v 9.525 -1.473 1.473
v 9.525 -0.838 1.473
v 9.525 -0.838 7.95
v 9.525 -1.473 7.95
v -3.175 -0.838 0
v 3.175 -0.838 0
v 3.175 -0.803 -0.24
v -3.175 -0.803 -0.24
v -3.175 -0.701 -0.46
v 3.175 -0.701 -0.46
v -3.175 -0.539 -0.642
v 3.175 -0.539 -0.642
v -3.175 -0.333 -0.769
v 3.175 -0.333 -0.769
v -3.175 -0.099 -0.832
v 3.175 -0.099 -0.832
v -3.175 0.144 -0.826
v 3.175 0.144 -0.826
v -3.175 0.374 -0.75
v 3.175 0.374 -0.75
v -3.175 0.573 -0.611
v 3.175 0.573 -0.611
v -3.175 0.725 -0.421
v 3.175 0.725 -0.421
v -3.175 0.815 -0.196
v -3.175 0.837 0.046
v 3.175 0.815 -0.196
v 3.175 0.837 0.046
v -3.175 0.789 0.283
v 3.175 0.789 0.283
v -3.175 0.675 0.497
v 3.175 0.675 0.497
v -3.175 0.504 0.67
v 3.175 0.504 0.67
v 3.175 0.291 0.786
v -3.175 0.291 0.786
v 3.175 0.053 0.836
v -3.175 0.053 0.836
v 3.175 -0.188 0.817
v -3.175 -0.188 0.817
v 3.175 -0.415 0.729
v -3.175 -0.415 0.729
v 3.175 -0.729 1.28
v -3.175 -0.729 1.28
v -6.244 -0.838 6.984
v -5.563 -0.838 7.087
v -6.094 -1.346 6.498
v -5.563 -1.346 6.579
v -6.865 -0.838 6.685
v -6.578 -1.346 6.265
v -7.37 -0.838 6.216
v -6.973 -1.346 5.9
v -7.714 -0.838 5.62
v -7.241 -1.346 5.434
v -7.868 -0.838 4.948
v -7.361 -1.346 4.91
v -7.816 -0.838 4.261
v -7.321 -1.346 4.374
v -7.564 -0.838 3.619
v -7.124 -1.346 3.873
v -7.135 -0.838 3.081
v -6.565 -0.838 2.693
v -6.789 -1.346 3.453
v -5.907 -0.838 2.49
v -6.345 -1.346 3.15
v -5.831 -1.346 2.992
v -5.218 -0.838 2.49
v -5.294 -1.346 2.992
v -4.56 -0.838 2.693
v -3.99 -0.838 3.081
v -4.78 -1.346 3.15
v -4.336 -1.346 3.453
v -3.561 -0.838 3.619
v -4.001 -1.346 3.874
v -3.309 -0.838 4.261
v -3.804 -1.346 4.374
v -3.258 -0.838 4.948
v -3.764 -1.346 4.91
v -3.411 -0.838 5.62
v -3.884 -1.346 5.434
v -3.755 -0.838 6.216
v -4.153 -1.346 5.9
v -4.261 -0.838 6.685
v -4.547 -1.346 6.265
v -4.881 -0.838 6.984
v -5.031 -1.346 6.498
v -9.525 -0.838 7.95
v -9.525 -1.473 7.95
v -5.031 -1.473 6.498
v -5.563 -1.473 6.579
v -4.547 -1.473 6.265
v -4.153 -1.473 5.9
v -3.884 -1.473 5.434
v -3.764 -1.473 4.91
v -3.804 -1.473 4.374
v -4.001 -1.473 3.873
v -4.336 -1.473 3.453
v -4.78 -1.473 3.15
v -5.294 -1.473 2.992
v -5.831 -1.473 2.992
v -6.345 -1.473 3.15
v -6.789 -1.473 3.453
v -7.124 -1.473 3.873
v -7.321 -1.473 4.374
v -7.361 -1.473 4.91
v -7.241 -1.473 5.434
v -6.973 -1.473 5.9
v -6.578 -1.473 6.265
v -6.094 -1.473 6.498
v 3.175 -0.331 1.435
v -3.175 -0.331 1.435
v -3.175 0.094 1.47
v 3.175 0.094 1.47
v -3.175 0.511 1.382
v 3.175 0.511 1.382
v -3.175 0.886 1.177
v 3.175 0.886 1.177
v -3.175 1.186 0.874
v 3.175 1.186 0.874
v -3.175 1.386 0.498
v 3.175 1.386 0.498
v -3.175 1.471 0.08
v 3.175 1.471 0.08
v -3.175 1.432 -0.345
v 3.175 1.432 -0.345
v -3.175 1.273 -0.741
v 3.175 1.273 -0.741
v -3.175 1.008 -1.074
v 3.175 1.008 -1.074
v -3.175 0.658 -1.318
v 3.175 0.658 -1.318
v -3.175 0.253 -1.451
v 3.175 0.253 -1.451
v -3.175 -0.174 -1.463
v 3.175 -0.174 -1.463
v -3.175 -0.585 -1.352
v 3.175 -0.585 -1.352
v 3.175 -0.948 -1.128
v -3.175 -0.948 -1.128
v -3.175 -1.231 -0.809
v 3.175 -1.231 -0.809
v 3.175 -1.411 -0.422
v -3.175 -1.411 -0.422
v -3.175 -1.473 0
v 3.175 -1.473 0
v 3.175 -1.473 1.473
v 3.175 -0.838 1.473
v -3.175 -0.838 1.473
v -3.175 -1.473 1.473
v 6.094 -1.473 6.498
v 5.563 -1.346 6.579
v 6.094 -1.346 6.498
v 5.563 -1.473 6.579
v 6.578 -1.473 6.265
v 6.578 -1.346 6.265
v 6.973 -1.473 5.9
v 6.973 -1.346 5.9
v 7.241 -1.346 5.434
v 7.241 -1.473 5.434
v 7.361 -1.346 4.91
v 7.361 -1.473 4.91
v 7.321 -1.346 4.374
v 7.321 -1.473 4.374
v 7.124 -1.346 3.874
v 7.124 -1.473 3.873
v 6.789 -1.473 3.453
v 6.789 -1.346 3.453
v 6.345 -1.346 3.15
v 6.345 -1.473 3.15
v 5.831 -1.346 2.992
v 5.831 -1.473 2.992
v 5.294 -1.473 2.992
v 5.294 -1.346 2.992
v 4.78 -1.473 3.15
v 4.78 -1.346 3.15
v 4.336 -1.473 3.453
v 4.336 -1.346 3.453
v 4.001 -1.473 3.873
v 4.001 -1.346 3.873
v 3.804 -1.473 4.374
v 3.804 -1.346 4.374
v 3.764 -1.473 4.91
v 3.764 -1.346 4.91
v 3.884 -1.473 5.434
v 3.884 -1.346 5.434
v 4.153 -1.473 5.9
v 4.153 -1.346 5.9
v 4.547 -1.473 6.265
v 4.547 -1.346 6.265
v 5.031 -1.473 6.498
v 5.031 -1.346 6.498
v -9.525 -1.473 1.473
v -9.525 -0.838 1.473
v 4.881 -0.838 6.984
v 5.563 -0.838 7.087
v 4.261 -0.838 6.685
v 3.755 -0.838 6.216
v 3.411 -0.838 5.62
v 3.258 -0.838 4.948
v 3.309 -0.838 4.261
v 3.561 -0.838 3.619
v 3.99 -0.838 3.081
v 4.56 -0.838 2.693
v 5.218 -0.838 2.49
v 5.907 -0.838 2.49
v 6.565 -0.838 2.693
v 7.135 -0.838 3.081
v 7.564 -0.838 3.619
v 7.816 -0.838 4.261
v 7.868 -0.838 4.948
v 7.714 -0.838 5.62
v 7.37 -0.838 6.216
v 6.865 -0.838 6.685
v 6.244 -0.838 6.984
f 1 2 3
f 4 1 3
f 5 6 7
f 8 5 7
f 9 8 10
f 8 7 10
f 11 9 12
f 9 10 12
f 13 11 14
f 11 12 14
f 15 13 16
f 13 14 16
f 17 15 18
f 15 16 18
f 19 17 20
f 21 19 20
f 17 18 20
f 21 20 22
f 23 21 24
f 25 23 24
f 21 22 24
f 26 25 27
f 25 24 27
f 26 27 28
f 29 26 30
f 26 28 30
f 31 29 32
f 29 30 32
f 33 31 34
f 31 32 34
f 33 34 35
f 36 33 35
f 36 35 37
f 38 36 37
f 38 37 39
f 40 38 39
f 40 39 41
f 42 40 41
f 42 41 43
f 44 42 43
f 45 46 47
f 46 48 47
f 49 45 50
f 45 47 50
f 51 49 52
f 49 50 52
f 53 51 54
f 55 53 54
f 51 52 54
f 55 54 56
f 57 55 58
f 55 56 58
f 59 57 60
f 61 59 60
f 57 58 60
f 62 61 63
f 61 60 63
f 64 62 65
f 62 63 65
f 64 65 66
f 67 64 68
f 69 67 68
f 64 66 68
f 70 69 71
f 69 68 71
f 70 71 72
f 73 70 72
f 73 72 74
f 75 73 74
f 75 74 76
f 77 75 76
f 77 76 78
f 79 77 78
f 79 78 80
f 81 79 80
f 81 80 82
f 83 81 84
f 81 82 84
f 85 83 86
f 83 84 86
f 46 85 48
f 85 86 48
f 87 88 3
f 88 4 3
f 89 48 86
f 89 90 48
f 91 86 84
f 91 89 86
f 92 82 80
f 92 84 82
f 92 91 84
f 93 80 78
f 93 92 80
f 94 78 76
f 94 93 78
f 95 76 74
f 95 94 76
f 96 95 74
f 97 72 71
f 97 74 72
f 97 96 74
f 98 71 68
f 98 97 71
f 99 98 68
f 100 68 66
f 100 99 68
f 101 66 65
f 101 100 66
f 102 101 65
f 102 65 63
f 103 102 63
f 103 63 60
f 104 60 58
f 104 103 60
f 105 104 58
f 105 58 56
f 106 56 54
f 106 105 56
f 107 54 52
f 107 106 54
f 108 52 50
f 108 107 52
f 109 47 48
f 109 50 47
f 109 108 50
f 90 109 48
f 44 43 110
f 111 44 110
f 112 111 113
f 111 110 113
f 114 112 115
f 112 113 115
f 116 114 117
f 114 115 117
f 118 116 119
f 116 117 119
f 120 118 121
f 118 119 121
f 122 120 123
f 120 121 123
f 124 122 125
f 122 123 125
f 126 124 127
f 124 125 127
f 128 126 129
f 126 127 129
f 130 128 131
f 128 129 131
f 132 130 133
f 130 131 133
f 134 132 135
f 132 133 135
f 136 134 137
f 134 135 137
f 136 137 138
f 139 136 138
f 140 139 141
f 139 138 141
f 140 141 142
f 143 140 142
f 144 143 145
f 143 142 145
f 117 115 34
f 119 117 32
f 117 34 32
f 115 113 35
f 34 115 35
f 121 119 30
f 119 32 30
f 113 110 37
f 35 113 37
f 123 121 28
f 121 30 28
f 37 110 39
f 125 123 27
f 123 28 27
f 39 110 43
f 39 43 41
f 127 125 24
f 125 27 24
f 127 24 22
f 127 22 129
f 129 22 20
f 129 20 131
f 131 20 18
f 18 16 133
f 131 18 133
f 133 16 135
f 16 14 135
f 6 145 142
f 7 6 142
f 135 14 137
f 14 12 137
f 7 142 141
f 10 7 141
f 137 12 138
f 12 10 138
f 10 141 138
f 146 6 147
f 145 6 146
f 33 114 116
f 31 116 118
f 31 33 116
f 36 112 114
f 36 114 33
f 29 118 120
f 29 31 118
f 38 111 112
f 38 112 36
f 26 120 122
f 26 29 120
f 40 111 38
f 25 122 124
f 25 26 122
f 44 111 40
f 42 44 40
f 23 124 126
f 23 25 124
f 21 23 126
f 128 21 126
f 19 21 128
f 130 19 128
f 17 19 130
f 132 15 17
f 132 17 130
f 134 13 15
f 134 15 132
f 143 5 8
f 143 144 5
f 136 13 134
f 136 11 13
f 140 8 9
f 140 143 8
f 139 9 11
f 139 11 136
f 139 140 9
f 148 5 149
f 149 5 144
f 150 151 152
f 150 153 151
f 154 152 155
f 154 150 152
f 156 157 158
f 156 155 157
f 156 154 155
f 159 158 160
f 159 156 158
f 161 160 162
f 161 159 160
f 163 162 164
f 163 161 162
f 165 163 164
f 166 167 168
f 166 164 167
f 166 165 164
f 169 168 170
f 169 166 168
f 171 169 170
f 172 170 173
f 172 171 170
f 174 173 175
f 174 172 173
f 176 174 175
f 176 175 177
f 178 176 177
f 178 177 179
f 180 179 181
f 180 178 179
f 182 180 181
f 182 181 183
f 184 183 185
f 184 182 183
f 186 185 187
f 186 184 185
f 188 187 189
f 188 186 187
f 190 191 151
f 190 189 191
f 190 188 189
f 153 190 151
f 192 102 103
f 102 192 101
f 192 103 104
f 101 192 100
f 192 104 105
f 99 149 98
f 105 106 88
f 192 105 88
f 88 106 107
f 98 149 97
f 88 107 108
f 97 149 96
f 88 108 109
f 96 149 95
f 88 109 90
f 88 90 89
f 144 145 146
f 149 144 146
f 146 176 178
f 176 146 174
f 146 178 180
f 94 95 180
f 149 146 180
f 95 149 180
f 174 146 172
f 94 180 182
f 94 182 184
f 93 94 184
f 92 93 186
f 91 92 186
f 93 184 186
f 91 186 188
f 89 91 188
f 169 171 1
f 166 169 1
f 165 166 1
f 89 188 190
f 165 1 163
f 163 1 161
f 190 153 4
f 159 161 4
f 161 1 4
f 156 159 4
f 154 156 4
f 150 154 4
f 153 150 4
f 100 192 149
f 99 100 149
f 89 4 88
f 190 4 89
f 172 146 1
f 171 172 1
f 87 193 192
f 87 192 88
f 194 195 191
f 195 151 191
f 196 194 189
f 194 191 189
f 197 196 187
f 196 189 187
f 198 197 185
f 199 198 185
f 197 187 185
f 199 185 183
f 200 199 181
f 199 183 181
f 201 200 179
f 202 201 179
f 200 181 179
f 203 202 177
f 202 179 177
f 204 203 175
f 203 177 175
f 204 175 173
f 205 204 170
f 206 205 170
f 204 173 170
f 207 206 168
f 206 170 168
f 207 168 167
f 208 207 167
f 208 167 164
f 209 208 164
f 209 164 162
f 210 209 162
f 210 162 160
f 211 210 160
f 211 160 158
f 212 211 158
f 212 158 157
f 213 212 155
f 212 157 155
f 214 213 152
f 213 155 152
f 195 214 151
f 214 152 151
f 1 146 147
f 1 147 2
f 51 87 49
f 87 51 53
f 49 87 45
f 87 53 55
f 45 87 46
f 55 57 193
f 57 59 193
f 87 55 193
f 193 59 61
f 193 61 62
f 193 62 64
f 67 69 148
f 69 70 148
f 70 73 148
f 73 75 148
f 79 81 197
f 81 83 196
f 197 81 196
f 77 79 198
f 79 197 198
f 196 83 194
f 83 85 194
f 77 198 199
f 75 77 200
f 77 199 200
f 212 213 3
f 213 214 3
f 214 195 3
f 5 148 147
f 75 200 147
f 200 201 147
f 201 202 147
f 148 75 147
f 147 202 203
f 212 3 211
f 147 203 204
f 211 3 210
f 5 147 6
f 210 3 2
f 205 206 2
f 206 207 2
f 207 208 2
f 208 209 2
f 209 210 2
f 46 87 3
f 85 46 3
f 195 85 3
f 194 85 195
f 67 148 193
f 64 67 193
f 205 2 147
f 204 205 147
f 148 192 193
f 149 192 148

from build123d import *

# Parameters (mm, degrees)
BOSS_EXTRUDE1_DEPTH     = 9.525
CUT_EXTRUDE1_DEPTH      = 13.494063522
CUT_EXTRUDE1_DEPTH_BACK = 13.494063522
SKETCH4_W               = 6.35
SKETCH4_H               = 2.9464
CUT_EXTRUDE3_DEPTH      = 13.494063522
CUT_EXTRUDE3_DEPTH_BACK = 13.494063522
SKETCH9_R               = 1.8034


with BuildPart() as part:
    # Sketch3 → Boss-Extrude1 (new, symmetric)
    with BuildSketch(Plane(origin=(0, 0, 0), x_dir=(0, 0, -1), z_dir=(1, 0, 0))):
        with BuildLine():
            Line((0, -1.4732), (-7.9502, -1.4732))
            Line((-7.9502, -1.4732), (-7.9502, -0.8382))
            Line((-7.9502, -0.8382), (0, -0.8382))
            ThreePointArc((0, -0.8382), (0.421388638, 0.724576328), (-0.728533124, -0.414510226))
            Line((-0.728533124, -0.414510226), (-1.280452157, -0.728533124))
            ThreePointArc((-1.280452157, -0.728533124), (0.740622455, 1.273497789), (0, -1.4732))
        make_face()
    extrude(amount=BOSS_EXTRUDE1_DEPTH, both=True)

    # Sketch4 → Cut-Extrude1 (cut, two sides: drawn at the far end of the back side and taken through both)
    with BuildSketch(Plane(origin=(0, 0, 0), x_dir=(1, 0, 0), z_dir=(0, 1, 0)).offset(-CUT_EXTRUDE1_DEPTH_BACK)):
        with Locations((-6.35, 0)):
            Rectangle(SKETCH4_W, SKETCH4_H)
        with Locations((6.35, 0)):
            Rectangle(SKETCH4_W, SKETCH4_H)
    extrude(amount=CUT_EXTRUDE1_DEPTH + CUT_EXTRUDE1_DEPTH_BACK, mode=Mode.SUBTRACT)

    # Cut-Extrude2 cone 1 section (through the dimple's axis) → Cut-Extrude2 (revolve, cut)
    with BuildSketch(Plane(origin=(5.5626, -0.8382, 4.7752), x_dir=(0, 0, 1), z_dir=(1, 0, 0))):
        Polygon((0, 0), (2.3114, 0), (0, 2.3114), align=None)
    revolve(axis=Axis((5.5626, -0.8382, 4.7752), (0, -1, 0)), mode=Mode.SUBTRACT)

    # Cut-Extrude2 cone 2 section (through the dimple's axis) → Cut-Extrude2 cone 2 (revolve, cut)
    with BuildSketch(Plane(origin=(-5.5626, -0.8382, 4.7752), x_dir=(0, 0, 1), z_dir=(1, 0, 0))):
        Polygon((0, 0), (2.3114, 0), (0, 2.3114), align=None)
    revolve(axis=Axis((-5.5626, -0.8382, 4.7752), (0, -1, 0)), mode=Mode.SUBTRACT)

    # Sketch9 → Cut-Extrude3 (cut, two sides: drawn at the far end of the back side and taken through both)
    with BuildSketch(Plane(origin=(0, 0, 0), x_dir=(1, 0, 0), z_dir=(0, 1, 0)).offset(-CUT_EXTRUDE3_DEPTH_BACK)):
        with Locations(Location((5.5626, -4.7752, 0), (0, 0, 270))):
            Circle(SKETCH9_R)
        with Locations(Location((-5.5626, -4.7752, 0), (0, 0, 270))):
            Circle(SKETCH9_R)
    extrude(amount=CUT_EXTRUDE3_DEPTH + CUT_EXTRUDE3_DEPTH_BACK, mode=Mode.SUBTRACT)


solid = part.part
